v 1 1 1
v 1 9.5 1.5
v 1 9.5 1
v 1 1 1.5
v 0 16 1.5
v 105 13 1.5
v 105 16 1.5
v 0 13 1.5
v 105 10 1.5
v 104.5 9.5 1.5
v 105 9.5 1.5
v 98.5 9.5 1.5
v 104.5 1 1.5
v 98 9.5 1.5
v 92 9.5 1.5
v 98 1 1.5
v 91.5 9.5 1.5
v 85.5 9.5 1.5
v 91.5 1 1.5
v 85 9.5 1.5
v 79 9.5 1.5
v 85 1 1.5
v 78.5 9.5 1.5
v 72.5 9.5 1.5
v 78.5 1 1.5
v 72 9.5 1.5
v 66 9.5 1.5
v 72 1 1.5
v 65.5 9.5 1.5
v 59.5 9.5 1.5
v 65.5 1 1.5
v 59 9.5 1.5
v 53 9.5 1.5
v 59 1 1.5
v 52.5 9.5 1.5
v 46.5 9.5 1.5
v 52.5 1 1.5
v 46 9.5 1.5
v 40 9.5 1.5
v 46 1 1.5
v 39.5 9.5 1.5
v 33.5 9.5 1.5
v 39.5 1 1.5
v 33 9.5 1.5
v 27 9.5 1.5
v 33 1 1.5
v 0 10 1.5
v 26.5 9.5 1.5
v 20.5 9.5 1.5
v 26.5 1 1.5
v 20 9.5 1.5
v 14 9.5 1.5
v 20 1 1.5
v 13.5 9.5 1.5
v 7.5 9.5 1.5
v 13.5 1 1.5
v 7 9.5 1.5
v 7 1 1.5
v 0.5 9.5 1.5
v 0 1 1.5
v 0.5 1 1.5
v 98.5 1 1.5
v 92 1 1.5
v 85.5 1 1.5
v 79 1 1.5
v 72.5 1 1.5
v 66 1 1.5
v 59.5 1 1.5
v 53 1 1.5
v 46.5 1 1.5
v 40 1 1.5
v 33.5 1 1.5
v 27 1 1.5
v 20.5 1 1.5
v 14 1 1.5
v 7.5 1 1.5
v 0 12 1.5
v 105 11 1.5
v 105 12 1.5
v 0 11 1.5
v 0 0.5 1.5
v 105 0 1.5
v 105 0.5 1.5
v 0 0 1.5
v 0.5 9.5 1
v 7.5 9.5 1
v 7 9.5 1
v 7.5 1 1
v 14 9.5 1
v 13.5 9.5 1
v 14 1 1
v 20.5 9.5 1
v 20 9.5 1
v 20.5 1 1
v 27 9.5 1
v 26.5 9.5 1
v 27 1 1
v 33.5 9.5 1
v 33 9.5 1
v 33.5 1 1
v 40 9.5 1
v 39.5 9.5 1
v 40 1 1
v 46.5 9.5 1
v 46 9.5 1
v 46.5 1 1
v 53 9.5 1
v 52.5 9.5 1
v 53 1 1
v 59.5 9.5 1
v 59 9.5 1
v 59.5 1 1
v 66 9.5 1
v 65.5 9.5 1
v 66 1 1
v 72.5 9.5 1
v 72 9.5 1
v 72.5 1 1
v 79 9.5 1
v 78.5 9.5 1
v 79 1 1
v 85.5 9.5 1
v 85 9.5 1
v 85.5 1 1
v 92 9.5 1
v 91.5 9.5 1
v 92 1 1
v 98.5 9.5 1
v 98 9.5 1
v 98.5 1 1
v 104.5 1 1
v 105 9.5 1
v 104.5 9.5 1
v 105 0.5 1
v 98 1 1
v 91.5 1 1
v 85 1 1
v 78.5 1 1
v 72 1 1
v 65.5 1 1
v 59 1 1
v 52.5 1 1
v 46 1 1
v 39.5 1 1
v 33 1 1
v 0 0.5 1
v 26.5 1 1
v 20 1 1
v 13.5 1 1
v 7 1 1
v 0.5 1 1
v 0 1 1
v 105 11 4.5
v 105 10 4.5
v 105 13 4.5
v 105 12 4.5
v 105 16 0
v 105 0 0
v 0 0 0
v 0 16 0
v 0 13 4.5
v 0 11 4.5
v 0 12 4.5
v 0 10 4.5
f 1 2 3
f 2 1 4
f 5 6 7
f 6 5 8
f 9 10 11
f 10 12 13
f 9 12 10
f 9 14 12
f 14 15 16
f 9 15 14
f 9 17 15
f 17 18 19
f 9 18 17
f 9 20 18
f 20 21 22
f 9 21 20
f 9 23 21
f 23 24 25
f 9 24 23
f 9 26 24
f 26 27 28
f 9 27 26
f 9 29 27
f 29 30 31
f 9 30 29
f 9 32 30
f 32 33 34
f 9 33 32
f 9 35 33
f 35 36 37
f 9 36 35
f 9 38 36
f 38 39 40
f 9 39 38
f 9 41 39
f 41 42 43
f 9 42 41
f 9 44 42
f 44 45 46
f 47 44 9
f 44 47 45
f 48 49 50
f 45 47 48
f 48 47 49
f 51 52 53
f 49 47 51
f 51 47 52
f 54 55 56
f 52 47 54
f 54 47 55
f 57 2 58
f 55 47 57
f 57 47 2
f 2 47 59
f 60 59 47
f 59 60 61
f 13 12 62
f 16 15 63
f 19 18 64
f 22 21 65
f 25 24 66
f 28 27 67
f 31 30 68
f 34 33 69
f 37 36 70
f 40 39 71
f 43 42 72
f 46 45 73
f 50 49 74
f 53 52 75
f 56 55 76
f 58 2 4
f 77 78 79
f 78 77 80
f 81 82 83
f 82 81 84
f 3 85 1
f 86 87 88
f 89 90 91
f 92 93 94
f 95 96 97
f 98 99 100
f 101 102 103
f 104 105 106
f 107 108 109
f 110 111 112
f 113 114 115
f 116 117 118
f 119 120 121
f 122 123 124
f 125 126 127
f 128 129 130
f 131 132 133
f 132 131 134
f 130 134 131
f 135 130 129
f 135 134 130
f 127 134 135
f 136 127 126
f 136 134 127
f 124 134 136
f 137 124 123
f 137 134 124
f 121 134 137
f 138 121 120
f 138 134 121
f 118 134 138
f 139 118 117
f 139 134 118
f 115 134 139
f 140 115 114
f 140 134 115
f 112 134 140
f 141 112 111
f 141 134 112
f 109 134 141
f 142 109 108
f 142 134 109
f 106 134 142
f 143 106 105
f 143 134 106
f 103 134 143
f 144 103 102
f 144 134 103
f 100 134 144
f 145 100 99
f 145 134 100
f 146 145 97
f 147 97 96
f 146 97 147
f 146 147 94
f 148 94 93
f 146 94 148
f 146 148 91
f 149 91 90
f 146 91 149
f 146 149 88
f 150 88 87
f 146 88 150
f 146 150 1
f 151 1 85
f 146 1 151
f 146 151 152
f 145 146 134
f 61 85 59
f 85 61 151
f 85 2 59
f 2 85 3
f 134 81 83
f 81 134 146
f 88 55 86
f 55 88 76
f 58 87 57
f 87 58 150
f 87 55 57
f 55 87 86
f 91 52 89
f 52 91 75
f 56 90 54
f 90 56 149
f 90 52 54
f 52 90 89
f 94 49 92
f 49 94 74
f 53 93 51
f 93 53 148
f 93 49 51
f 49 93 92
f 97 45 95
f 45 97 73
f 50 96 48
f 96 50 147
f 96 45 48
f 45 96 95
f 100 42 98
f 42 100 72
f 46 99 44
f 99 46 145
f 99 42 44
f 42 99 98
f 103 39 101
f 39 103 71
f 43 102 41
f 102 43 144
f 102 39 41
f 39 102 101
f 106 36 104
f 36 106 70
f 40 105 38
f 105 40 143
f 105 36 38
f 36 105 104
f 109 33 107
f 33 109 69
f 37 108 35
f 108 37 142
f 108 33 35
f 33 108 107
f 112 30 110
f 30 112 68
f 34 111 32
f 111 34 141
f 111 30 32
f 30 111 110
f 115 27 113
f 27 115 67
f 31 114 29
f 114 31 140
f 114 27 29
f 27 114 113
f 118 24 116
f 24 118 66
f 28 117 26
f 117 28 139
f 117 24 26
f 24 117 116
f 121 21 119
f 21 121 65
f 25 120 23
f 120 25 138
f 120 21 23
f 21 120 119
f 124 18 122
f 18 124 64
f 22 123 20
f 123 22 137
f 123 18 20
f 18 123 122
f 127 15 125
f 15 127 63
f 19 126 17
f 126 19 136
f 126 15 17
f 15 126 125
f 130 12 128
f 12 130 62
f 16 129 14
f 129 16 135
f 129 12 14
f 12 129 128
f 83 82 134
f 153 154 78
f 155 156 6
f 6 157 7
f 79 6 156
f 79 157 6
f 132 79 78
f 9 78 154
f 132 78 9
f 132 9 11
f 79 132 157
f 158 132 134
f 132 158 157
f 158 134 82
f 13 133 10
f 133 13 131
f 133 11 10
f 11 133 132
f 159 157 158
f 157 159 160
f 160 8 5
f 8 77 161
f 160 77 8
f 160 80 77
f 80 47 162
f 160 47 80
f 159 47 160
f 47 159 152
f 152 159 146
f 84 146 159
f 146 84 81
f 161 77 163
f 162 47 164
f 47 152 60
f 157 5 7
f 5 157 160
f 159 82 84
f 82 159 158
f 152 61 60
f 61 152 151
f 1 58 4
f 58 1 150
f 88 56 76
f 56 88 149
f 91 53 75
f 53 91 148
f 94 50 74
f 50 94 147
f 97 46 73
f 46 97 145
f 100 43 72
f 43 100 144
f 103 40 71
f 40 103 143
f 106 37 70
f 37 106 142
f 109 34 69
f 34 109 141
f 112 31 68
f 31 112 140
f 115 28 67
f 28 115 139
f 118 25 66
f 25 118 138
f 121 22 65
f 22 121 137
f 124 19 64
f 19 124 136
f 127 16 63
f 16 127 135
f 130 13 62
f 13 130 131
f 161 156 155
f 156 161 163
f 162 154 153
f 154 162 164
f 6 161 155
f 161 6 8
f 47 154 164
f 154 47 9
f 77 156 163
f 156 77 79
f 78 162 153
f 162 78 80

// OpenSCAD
// Sidewalk lengths: 105, 34
sidewalkLength=105;
// how far out from the building does the sidewalk extend.
sidewalkWidth=10;
// height of the sidewak.
sidewalkHeight=1.5;
// Depth of the sidewalk grooves
grooveZ=0.5;
// How wide to make the support that the building is in. 3 might be too thin. 5 might be better.
buildingSupportWidth=3;
// How high above the sidewalk to make the building supports.
buildingSupportHeight=3;
// Thickness of the paper buildings, i.e. how wide a groove to make for the building.
paperY=1;

//Sidewalk
difference() {
    cube([sidewalkLength, sidewalkWidth + buildingSupportWidth*2, sidewalkHeight]);
//  front groove
    translate([-1,grooveZ,sidewalkHeight-grooveZ]) cube([sidewalkLength+sidewalkWidth+2, 0.5, grooveZ]);
    // grooves
    for(x=[grooveZ : 6.5 : sidewalkLength]) {
        translate([x, grooveZ, sidewalkHeight-grooveZ]) cube([grooveZ,sidewalkWidth-2*grooveZ,grooveZ]);
    }
}
translate([0, sidewalkWidth, sidewalkHeight]) difference() {
    cube([sidewalkLength, buildingSupportWidth,buildingSupportHeight]);
    translate([-1,(buildingSupportWidth-paperY)/2,0]) cube([sidewalkLength+2,paperY,buildingSupportHeight+1]);
}
